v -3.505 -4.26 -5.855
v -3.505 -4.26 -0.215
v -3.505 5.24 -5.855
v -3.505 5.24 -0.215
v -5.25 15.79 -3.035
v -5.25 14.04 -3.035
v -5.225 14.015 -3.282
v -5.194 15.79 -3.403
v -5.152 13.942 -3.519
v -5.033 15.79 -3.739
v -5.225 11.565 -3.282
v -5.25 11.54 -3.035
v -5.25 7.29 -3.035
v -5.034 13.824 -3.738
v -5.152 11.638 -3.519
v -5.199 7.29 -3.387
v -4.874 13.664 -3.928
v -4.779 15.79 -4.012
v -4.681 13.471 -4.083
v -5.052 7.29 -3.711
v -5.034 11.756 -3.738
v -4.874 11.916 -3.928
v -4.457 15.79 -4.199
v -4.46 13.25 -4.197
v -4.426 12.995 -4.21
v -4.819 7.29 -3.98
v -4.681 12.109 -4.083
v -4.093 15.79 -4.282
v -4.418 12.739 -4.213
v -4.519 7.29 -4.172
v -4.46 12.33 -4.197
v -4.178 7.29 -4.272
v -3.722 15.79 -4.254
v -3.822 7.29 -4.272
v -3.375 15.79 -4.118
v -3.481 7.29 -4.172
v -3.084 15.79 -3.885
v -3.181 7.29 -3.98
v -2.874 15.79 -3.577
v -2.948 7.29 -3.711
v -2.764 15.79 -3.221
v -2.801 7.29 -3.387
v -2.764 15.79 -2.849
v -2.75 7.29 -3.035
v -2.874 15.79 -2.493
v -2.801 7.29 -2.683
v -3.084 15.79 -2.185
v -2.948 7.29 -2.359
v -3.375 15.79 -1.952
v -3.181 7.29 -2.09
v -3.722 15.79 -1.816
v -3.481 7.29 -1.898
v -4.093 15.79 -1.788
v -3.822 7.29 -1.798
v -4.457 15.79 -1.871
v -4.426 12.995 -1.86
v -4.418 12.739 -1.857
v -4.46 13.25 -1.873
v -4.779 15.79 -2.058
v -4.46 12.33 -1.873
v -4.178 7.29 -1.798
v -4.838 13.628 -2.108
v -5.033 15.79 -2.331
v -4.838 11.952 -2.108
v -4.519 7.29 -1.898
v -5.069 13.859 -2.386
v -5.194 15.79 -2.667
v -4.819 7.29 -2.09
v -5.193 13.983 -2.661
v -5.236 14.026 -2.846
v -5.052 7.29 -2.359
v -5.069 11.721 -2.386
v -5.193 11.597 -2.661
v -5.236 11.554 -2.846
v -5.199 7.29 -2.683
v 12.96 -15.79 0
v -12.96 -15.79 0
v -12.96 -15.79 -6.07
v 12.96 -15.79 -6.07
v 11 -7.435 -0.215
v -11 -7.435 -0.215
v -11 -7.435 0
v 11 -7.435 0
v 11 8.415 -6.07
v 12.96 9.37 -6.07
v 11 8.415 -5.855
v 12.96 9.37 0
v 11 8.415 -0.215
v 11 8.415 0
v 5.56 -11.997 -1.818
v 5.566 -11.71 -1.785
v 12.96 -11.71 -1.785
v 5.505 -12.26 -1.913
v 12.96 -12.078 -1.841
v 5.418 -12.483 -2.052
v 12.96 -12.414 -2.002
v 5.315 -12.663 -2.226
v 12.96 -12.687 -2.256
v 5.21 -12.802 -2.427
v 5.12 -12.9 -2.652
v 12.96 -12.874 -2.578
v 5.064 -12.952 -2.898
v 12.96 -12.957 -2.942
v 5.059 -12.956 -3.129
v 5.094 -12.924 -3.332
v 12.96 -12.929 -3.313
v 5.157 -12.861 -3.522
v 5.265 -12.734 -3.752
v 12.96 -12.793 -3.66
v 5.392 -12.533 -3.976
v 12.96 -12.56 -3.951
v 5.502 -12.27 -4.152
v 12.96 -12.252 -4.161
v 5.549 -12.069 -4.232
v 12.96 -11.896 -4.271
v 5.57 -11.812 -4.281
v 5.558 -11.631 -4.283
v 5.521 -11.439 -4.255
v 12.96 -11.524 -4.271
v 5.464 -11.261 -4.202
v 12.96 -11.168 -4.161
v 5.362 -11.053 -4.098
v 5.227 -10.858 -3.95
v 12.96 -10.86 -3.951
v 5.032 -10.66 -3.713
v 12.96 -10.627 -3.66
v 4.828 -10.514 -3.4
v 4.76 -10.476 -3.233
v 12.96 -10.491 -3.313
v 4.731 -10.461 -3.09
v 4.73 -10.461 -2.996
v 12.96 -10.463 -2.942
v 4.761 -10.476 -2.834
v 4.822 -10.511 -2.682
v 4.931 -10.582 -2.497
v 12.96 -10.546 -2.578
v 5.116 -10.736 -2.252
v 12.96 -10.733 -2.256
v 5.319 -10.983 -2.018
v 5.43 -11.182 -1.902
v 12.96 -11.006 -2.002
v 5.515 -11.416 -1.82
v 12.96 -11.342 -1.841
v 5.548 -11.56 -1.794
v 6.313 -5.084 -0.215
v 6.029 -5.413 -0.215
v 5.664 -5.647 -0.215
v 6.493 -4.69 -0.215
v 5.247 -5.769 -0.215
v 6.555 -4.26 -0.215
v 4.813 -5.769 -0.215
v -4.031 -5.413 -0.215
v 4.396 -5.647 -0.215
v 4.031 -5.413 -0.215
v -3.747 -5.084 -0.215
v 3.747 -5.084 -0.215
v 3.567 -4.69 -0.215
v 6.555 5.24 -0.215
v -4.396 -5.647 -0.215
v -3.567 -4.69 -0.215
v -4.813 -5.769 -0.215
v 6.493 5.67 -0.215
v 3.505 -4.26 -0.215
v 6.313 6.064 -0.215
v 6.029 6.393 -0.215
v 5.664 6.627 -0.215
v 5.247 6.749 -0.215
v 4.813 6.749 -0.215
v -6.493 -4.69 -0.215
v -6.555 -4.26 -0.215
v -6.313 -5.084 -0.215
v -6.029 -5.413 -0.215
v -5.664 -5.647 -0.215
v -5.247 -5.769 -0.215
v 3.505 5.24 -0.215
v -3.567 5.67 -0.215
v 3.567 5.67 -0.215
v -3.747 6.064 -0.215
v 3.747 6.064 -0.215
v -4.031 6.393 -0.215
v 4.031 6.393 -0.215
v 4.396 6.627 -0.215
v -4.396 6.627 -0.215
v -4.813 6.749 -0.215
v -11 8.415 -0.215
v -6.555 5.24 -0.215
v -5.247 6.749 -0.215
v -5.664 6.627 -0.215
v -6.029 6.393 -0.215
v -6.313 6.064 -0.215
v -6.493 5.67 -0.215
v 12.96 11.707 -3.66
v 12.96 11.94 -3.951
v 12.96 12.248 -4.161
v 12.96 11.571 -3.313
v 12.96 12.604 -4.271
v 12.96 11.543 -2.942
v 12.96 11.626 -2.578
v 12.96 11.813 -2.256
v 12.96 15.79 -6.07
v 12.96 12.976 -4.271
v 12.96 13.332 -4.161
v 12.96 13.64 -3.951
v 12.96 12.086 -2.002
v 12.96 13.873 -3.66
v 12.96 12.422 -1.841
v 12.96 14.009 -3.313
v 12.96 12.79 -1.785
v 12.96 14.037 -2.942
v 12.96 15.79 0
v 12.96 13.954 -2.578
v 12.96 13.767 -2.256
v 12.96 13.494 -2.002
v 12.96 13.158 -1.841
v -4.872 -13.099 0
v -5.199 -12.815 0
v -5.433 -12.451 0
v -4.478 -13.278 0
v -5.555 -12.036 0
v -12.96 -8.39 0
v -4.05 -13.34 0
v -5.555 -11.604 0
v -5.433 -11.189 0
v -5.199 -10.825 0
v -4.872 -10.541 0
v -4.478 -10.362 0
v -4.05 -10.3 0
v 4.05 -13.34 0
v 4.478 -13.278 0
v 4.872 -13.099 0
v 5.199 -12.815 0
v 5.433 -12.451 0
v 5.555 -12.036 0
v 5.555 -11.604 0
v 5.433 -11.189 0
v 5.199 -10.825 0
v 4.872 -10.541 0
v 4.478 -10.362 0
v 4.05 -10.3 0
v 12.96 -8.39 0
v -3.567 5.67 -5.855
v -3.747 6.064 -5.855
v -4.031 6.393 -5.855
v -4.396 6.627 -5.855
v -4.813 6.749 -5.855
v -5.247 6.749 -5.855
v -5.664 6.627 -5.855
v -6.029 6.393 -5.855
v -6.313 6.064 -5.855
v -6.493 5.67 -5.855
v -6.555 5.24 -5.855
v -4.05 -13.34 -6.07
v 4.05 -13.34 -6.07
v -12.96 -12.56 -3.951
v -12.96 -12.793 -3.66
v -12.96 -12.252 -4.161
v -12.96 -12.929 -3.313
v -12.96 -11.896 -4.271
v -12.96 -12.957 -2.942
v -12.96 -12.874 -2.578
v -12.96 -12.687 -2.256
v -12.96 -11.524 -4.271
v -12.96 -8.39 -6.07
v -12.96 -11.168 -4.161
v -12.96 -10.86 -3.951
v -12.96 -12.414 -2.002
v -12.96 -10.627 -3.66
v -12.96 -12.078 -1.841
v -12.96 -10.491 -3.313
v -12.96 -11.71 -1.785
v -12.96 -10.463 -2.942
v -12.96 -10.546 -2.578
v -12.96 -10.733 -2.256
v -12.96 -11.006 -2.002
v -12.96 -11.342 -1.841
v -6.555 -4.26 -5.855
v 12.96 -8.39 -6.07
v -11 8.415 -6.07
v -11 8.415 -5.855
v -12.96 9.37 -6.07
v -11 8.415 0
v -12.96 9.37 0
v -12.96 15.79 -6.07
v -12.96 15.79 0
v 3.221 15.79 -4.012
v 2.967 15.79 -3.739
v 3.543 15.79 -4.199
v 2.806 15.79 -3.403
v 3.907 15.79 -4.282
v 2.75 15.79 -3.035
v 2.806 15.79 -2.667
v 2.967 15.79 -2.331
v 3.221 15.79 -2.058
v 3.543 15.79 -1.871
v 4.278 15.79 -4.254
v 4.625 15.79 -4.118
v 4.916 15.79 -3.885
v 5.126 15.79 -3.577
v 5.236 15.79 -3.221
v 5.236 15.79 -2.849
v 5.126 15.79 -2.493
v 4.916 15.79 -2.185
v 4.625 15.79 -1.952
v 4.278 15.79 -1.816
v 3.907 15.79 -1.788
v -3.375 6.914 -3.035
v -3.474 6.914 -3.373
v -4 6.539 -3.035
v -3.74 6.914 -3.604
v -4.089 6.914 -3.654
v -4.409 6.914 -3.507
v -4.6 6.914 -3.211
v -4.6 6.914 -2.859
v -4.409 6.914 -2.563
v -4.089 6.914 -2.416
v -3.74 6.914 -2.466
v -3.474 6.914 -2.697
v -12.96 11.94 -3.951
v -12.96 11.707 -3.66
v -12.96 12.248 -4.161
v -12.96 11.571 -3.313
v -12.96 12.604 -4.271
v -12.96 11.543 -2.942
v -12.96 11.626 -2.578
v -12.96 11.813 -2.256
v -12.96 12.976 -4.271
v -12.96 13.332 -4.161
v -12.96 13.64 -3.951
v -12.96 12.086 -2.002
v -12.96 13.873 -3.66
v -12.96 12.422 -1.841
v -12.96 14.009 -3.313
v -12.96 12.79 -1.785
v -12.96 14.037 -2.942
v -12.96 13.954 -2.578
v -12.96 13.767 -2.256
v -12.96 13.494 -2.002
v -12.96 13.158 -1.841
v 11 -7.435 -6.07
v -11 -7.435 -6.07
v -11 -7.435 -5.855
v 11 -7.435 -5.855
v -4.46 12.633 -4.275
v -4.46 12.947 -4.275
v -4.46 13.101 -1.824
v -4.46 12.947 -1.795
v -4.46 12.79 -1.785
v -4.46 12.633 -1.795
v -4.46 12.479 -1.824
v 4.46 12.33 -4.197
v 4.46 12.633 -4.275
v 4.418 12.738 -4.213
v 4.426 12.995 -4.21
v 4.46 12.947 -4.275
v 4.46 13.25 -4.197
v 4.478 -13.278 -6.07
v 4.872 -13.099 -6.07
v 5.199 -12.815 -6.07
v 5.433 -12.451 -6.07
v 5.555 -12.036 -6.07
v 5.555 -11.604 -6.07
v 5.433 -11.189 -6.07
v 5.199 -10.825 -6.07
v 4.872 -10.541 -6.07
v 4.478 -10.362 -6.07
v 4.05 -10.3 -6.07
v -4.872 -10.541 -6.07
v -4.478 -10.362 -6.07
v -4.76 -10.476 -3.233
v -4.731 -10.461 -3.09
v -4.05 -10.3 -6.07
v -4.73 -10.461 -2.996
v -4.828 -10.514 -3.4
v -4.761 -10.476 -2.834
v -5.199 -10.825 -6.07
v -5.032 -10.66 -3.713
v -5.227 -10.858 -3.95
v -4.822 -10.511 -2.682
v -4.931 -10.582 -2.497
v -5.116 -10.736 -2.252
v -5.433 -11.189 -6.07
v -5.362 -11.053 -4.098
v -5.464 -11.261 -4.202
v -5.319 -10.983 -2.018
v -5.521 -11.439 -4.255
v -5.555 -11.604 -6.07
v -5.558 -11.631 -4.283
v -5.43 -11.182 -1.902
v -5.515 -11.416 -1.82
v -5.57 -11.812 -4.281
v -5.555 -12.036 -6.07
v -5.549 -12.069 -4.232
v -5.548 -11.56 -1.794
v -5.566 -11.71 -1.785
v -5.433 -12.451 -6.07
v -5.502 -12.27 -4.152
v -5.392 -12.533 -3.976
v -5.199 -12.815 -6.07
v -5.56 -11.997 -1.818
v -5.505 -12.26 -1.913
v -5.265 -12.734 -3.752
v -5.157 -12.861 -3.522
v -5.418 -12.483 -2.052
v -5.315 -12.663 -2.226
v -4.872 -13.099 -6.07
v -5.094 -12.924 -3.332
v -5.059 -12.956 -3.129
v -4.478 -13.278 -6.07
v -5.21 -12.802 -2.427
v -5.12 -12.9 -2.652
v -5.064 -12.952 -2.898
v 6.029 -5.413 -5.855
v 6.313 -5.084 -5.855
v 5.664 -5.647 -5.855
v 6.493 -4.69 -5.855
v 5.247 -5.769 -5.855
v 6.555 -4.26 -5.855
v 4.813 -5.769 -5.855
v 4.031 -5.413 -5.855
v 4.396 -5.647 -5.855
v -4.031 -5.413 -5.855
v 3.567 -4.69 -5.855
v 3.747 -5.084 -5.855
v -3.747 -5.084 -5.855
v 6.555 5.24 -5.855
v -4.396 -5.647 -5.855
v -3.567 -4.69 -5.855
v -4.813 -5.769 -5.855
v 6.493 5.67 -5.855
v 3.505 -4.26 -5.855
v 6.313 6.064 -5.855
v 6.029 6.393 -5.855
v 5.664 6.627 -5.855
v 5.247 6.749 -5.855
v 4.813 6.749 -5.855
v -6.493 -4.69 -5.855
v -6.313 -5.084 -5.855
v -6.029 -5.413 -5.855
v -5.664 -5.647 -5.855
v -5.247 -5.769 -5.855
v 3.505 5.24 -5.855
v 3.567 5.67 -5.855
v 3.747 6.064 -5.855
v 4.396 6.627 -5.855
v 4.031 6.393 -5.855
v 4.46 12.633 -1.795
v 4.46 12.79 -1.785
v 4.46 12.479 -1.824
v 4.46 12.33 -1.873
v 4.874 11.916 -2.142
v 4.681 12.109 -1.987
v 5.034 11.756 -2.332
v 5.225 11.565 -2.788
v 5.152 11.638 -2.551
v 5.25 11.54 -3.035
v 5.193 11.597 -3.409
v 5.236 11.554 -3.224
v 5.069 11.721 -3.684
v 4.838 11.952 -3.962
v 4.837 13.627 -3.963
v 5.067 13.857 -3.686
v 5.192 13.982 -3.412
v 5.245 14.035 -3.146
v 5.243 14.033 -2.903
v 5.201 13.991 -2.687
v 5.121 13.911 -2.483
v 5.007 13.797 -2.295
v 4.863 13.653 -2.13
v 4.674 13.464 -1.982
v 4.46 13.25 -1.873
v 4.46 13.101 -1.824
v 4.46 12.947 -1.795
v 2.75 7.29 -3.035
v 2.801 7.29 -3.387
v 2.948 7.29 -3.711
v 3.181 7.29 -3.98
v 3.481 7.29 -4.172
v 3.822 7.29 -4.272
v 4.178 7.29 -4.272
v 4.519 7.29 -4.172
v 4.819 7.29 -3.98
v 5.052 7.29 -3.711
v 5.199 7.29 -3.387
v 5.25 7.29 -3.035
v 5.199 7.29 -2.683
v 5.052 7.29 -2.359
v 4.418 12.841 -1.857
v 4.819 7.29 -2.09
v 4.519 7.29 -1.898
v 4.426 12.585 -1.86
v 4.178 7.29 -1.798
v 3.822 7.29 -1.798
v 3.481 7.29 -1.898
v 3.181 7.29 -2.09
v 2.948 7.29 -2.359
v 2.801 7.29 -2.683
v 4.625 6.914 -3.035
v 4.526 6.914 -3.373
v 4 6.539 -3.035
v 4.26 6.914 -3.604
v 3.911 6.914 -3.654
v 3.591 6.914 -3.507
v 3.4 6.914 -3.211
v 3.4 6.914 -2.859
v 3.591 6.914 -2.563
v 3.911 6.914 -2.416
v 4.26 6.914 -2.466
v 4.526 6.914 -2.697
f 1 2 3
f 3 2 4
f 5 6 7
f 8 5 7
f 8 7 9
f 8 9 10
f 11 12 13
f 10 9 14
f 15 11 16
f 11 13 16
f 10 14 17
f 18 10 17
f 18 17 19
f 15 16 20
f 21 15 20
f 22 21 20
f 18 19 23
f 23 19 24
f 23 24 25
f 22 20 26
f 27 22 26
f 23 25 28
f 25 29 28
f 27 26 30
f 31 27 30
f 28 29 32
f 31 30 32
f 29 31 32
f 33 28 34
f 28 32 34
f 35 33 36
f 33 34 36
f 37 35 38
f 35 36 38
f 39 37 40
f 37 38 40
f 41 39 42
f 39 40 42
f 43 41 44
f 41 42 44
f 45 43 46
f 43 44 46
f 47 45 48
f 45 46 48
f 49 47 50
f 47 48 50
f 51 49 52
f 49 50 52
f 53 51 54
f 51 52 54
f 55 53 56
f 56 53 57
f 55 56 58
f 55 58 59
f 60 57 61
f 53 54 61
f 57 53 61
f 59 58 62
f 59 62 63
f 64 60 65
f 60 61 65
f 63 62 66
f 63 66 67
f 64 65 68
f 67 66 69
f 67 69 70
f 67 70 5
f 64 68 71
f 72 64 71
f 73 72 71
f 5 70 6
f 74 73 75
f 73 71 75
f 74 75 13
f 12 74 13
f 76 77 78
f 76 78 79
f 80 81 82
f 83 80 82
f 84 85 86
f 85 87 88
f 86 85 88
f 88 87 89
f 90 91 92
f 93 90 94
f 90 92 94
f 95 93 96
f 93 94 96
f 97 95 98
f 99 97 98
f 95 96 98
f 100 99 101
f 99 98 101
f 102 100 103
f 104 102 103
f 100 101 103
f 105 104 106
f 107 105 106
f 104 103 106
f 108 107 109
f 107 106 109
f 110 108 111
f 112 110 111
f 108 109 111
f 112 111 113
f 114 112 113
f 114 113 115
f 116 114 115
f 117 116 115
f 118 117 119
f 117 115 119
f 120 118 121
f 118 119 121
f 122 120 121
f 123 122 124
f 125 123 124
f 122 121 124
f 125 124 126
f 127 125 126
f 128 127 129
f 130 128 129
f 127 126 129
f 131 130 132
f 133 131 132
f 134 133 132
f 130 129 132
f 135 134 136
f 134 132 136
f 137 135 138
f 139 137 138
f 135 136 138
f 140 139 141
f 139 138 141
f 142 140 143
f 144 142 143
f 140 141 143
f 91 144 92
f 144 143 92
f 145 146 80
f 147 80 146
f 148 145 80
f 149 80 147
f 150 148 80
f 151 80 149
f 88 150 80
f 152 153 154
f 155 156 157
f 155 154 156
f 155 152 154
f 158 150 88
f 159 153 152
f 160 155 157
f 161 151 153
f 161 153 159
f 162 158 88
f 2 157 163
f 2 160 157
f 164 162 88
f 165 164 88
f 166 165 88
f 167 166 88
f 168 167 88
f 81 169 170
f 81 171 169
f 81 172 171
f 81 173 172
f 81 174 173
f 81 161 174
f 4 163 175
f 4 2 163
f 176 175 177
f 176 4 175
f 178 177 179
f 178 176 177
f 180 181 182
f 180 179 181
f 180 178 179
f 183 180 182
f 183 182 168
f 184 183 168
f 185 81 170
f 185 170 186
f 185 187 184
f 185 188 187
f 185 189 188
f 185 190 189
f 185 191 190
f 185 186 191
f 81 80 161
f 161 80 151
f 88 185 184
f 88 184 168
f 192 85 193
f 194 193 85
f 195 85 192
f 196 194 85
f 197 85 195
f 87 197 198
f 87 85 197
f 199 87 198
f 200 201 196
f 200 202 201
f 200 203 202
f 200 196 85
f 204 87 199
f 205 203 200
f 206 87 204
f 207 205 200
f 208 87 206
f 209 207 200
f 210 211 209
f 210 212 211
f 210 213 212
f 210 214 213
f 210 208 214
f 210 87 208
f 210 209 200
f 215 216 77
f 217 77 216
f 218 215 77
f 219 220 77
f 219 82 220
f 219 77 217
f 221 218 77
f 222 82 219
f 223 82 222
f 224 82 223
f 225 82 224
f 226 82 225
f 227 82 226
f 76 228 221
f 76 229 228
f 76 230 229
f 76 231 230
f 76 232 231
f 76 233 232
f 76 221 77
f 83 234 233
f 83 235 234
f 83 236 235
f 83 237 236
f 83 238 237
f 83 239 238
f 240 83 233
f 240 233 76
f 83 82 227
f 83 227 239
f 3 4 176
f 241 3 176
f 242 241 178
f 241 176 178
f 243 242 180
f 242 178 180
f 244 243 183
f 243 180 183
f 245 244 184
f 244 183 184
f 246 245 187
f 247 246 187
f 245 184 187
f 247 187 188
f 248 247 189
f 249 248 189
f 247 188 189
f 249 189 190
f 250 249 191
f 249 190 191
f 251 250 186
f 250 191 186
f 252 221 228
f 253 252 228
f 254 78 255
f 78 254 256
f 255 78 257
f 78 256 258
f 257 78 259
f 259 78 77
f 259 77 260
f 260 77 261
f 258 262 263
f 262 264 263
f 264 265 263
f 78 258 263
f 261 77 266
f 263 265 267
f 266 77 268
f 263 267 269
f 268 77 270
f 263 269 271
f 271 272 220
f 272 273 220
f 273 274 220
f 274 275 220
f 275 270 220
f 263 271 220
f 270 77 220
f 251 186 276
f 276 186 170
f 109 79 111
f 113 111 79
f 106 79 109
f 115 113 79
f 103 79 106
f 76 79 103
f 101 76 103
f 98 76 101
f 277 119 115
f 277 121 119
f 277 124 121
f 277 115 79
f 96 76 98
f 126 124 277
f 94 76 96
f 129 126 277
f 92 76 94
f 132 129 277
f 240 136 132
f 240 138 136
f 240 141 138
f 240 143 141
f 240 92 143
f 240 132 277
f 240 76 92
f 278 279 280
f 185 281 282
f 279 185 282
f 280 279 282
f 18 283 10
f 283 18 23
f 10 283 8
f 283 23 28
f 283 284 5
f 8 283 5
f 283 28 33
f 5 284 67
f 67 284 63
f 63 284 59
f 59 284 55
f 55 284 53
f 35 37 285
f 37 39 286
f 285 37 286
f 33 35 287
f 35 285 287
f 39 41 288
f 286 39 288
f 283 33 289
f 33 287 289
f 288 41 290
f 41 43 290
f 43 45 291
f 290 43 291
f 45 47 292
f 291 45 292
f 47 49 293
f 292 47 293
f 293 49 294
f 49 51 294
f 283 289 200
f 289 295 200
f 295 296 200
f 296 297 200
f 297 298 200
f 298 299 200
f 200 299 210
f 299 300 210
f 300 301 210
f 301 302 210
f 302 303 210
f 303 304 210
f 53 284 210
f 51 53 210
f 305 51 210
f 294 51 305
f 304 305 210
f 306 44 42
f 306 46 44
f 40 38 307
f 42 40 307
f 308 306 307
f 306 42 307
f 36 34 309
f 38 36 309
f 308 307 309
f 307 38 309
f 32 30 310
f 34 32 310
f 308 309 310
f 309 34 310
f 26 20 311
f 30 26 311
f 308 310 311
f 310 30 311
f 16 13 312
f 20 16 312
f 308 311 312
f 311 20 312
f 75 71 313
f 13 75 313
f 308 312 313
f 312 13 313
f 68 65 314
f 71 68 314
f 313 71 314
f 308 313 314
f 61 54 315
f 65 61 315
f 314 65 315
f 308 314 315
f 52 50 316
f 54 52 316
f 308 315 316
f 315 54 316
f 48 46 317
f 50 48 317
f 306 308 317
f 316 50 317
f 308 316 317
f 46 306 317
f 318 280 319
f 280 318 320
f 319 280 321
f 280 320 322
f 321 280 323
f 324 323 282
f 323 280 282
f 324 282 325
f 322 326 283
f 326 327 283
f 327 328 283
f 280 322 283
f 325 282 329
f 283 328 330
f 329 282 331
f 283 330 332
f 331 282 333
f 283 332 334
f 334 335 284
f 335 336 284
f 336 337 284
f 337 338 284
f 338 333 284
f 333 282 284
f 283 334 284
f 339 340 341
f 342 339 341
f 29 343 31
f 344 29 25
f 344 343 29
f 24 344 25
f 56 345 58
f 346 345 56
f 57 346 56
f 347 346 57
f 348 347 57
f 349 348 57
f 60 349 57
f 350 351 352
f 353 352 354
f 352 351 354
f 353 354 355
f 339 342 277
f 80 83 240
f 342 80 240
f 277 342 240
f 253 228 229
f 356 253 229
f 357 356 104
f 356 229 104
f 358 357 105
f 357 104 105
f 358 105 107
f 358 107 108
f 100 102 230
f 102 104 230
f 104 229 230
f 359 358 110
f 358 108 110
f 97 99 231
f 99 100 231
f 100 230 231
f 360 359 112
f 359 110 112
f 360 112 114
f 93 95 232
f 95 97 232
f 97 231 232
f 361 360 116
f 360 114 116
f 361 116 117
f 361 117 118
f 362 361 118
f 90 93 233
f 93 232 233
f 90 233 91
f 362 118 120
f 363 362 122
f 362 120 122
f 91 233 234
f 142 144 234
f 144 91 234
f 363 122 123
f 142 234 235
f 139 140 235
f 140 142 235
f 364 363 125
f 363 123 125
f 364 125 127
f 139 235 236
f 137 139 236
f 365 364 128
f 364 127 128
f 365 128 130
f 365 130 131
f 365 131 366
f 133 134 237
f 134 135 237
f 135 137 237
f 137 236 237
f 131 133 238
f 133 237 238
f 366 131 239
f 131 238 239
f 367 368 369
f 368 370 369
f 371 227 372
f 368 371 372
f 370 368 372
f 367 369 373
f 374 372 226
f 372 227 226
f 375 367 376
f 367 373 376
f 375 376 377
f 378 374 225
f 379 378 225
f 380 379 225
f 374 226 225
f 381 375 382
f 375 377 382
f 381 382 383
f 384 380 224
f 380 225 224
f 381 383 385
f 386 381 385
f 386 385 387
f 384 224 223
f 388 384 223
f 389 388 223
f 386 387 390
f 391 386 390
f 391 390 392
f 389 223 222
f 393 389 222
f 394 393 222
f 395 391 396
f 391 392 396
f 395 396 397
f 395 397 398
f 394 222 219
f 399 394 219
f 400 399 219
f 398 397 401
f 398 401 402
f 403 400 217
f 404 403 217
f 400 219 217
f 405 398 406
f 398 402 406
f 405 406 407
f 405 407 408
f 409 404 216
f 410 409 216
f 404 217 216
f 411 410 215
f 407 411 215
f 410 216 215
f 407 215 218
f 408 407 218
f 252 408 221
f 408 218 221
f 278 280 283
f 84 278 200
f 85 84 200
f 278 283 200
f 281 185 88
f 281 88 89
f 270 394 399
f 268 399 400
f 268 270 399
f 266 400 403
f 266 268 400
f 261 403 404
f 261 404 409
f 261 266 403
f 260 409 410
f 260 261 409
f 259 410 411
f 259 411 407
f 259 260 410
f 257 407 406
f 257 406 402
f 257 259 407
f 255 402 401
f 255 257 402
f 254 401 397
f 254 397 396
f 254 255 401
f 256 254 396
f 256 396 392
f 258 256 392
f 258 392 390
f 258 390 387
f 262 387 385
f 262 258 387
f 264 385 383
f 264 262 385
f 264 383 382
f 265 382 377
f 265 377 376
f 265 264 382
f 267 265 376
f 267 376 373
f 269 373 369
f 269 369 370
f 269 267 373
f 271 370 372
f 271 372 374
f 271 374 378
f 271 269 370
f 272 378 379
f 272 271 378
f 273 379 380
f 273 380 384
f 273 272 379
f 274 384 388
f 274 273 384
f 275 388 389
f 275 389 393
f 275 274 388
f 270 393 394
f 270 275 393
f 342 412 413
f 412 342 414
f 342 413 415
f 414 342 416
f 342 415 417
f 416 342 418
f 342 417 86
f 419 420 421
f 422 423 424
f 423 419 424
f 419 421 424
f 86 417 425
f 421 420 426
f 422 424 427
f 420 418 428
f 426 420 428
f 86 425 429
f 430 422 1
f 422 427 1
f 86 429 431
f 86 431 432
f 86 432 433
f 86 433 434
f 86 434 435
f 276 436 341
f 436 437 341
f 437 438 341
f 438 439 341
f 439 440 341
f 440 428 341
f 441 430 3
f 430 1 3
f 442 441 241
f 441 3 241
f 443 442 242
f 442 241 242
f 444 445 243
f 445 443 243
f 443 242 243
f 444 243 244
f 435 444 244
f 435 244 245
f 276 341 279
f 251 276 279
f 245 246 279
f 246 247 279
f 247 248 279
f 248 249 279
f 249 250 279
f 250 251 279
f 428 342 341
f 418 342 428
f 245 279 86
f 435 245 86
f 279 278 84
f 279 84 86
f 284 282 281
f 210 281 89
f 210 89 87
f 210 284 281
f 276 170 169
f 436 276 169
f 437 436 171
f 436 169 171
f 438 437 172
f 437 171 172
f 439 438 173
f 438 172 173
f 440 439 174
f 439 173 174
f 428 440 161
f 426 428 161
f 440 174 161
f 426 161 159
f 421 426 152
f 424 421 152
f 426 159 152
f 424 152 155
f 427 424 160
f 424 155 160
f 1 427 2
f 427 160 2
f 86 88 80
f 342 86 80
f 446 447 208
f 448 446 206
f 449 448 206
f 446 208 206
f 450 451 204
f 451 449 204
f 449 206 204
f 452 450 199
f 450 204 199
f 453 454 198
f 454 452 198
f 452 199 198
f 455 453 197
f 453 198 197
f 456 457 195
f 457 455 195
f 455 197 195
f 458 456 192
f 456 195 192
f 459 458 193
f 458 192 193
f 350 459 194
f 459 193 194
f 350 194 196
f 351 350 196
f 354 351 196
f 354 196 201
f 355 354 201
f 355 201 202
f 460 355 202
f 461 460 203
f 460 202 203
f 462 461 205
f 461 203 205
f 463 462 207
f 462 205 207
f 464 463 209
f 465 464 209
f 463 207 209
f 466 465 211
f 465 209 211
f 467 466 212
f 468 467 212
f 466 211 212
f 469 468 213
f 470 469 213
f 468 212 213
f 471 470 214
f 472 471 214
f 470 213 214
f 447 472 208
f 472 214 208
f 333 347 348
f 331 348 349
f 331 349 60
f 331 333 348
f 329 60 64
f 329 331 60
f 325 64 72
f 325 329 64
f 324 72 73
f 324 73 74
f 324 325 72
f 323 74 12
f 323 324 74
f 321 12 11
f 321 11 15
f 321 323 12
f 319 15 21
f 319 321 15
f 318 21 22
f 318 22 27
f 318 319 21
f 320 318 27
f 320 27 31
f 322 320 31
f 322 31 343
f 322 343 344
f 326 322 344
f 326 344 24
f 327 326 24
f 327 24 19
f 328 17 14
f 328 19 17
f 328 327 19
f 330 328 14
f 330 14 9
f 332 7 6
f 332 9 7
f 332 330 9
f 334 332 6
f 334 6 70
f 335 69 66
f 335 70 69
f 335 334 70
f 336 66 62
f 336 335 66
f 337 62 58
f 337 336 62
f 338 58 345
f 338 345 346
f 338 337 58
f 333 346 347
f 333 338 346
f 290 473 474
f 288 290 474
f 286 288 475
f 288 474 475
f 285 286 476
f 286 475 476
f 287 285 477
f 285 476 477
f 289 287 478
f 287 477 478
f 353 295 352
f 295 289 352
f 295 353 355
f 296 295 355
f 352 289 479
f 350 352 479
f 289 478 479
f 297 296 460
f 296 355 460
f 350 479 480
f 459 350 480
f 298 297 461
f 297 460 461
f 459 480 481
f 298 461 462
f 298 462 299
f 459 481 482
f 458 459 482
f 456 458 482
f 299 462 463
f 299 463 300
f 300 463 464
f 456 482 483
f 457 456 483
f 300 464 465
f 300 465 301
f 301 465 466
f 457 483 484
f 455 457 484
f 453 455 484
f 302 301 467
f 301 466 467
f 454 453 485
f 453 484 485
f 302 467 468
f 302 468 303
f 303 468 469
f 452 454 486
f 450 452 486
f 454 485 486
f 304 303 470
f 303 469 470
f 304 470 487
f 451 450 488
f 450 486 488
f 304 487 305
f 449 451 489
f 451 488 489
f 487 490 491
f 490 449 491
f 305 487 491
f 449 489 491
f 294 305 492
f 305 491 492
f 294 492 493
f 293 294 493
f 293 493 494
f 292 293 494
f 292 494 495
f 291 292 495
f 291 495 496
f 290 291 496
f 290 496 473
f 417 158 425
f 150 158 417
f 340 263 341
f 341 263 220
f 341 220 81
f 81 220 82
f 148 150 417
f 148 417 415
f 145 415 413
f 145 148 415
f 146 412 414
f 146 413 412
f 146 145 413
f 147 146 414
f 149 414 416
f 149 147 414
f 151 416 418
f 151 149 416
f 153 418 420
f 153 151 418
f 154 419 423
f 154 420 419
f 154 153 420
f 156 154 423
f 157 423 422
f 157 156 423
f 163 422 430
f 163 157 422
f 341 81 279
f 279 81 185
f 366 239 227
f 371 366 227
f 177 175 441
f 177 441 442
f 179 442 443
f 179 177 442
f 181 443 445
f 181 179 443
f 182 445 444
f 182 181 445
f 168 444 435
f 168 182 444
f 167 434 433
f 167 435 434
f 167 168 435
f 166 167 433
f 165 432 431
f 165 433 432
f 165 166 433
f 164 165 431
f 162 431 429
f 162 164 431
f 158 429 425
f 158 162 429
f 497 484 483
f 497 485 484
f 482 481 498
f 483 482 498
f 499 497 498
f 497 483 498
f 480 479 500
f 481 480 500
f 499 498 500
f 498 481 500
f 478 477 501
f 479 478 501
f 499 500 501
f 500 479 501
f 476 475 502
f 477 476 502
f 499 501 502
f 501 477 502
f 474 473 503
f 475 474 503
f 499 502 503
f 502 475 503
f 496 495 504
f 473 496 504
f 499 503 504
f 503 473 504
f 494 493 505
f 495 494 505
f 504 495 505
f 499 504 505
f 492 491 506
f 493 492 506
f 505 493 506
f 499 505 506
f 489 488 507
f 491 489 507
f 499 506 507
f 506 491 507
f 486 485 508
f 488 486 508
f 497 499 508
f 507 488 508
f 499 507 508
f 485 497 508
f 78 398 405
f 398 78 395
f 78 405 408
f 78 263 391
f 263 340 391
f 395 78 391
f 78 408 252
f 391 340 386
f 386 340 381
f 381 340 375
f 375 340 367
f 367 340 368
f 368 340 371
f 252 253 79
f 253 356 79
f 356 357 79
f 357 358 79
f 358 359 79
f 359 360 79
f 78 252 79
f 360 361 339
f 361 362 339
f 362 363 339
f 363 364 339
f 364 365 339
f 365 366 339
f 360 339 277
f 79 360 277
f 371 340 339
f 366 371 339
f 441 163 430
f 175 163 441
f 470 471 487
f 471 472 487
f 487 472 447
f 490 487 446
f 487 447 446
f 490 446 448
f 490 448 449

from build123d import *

# Parameters (mm, degrees)
SCHIZZO1_W                         = 25.92
SCHIZZO1_H                         = 31.58
ESTRUSIONE_ESTRUSIONE1_DEPTH       = 6.07
TAGLIO_ESTRUSIONE1_DEPTH           = 22.310340213
SCHIZZO3_W                         = 0.215
SCHIZZO3_H                         = 15.85
TAGLIO_ESTRUSIONE2_DEPTH           = 31.951823856
FORO_FILETTATO_M3X0_5_1_D          = 2.5
FORO_FILETTATO_M3X0_5_1_DEPTH      = 8.5
FORO_FILETTATO_M3X0_5_1_TIP        = 0.751075774
FORO_FILETTATO_M3X0_5_3_AT_2_COUNT = 2
FORO_FILETTATO_M3X0_5_3_AT_2_PITCH = 24.5


with BuildPart() as part:
    # Schizzo1 → Estrusione-Estrusione1 (new body)
    with BuildSketch(Plane.XY):
        Rectangle(SCHIZZO1_W, SCHIZZO1_H)
    extrude(amount=-ESTRUSIONE_ESTRUSIONE1_DEPTH)

    # Schizzo2 → Taglio-Estrusione1 (cut, through all)
    with BuildSketch(Plane.XY):
        Polygon((-11, 8.415), (-12.96, 9.37), (-12.96, -8.39), (-11, -7.435), align=None)
        with BuildLine():
            Line((-6.555, 5.24), (-6.555, -4.26))
            ThreePointArc((-6.555, -4.26), (-5.03, -5.785), (-3.505, -4.26))
            Line((-3.505, -4.26), (-3.505, 5.24))
            ThreePointArc((-3.505, 5.24), (-5.03, 6.765), (-6.555, 5.24))
        make_face()
        with BuildLine():
            ThreePointArc((6.555, -4.26), (5.03, -5.785), (3.505, -4.26))
            Line((3.505, -4.26), (3.505, 5.24))
            ThreePointArc((3.505, 5.24), (5.03, 6.765), (6.555, 5.24))
            Line((6.555, 5.24), (6.555, -4.26))
        make_face()
        Polygon((12.96, -8.39), (12.96, 9.37), (11, 8.415), (11, -7.435), align=None)
        with BuildLine():
            Line((-4.05, -13.34), (4.05, -13.34))
            ThreePointArc((4.05, -13.34), (5.57, -11.82), (4.05, -10.3))
            Line((4.05, -10.3), (-4.05, -10.3))
            ThreePointArc((-4.05, -10.3), (-5.57, -11.82), (-4.05, -13.34))
        make_face()
    extrude(amount=-TAGLIO_ESTRUSIONE1_DEPTH, mode=Mode.SUBTRACT)

    # Schizzo3 → Taglio-Estrusione2 (cut, through all)
    with BuildSketch(Plane.ZY.offset(12.96)):
        with Locations((-5.9625, 0.49)):
            Rectangle(SCHIZZO3_W, SCHIZZO3_H)
        with Locations((-0.1075, 0.49)):
            Rectangle(SCHIZZO3_W, SCHIZZO3_H)
    extrude(amount=-TAGLIO_ESTRUSIONE2_DEPTH, mode=Mode.SUBTRACT)

    # Foro filettato M3x0.5-1
    with Locations(Plane(origin=(0, 15.79, 0), x_dir=(1, 0, 0), z_dir=(0, 1, 0))):
        with Locations((-4, 3.035), (4, 3.035)):
            Hole(FORO_FILETTATO_M3X0_5_1_D / 2, depth=FORO_FILETTATO_M3X0_5_1_DEPTH)
            with Locations((0, 0, -(FORO_FILETTATO_M3X0_5_1_DEPTH + FORO_FILETTATO_M3X0_5_1_TIP / 2))):  # 118° drill point
                Cone(0, FORO_FILETTATO_M3X0_5_1_D / 2, FORO_FILETTATO_M3X0_5_1_TIP, mode=Mode.SUBTRACT)

    # Schizzo8 → Foro filettato M3x0.5-3 (revolve, cut)
    with BuildSketch(Plane(origin=(-12.96, 12.79, -3.035), x_dir=(0, 0, 1), z_dir=(0, 1, 0))):
        Polygon((0, 0), (0, 9.251075774), (1.25, 8.5), (1.25, 0), align=None)
    foro_filettato_m3x0_5_3 = revolve(axis=Axis((-19.31, 12.79, -3.035), (1, 0, 0)), mode=Mode.SUBTRACT)

    # Foro filettato M3x0.5-3 at 2: Foro filettato M3x0.5-3 ×2
    with Locations(*[(0, -i * FORO_FILETTATO_M3X0_5_3_AT_2_PITCH, 0) for i in range(1, FORO_FILETTATO_M3X0_5_3_AT_2_COUNT)]):
        add(foro_filettato_m3x0_5_3, mode=Mode.SUBTRACT)

    # Specchia1: Foro filettato M3x0.5-3 across plane
    add(foro_filettato_m3x0_5_3.mirror(Plane(origin=(0, 0, 0), x_dir=(0, 0, 1), z_dir=(1, 0, 0))), mode=Mode.SUBTRACT)

    # Specchia1 copy 1 sketch → Specchia1 copy 1 (revolve, cut)
    with BuildSketch(Plane(origin=(12.96, -11.71, -3.035), x_dir=(0, 0, 1), z_dir=(0, 1, 0))):
        Polygon((0, 0), (0, -9.251075774), (1.25, -8.5), (1.25, 0), align=None)
    revolve(axis=Axis((19.31, -11.71, -3.035), (1, 0, 0)), mode=Mode.SUBTRACT)


solid = part.part
